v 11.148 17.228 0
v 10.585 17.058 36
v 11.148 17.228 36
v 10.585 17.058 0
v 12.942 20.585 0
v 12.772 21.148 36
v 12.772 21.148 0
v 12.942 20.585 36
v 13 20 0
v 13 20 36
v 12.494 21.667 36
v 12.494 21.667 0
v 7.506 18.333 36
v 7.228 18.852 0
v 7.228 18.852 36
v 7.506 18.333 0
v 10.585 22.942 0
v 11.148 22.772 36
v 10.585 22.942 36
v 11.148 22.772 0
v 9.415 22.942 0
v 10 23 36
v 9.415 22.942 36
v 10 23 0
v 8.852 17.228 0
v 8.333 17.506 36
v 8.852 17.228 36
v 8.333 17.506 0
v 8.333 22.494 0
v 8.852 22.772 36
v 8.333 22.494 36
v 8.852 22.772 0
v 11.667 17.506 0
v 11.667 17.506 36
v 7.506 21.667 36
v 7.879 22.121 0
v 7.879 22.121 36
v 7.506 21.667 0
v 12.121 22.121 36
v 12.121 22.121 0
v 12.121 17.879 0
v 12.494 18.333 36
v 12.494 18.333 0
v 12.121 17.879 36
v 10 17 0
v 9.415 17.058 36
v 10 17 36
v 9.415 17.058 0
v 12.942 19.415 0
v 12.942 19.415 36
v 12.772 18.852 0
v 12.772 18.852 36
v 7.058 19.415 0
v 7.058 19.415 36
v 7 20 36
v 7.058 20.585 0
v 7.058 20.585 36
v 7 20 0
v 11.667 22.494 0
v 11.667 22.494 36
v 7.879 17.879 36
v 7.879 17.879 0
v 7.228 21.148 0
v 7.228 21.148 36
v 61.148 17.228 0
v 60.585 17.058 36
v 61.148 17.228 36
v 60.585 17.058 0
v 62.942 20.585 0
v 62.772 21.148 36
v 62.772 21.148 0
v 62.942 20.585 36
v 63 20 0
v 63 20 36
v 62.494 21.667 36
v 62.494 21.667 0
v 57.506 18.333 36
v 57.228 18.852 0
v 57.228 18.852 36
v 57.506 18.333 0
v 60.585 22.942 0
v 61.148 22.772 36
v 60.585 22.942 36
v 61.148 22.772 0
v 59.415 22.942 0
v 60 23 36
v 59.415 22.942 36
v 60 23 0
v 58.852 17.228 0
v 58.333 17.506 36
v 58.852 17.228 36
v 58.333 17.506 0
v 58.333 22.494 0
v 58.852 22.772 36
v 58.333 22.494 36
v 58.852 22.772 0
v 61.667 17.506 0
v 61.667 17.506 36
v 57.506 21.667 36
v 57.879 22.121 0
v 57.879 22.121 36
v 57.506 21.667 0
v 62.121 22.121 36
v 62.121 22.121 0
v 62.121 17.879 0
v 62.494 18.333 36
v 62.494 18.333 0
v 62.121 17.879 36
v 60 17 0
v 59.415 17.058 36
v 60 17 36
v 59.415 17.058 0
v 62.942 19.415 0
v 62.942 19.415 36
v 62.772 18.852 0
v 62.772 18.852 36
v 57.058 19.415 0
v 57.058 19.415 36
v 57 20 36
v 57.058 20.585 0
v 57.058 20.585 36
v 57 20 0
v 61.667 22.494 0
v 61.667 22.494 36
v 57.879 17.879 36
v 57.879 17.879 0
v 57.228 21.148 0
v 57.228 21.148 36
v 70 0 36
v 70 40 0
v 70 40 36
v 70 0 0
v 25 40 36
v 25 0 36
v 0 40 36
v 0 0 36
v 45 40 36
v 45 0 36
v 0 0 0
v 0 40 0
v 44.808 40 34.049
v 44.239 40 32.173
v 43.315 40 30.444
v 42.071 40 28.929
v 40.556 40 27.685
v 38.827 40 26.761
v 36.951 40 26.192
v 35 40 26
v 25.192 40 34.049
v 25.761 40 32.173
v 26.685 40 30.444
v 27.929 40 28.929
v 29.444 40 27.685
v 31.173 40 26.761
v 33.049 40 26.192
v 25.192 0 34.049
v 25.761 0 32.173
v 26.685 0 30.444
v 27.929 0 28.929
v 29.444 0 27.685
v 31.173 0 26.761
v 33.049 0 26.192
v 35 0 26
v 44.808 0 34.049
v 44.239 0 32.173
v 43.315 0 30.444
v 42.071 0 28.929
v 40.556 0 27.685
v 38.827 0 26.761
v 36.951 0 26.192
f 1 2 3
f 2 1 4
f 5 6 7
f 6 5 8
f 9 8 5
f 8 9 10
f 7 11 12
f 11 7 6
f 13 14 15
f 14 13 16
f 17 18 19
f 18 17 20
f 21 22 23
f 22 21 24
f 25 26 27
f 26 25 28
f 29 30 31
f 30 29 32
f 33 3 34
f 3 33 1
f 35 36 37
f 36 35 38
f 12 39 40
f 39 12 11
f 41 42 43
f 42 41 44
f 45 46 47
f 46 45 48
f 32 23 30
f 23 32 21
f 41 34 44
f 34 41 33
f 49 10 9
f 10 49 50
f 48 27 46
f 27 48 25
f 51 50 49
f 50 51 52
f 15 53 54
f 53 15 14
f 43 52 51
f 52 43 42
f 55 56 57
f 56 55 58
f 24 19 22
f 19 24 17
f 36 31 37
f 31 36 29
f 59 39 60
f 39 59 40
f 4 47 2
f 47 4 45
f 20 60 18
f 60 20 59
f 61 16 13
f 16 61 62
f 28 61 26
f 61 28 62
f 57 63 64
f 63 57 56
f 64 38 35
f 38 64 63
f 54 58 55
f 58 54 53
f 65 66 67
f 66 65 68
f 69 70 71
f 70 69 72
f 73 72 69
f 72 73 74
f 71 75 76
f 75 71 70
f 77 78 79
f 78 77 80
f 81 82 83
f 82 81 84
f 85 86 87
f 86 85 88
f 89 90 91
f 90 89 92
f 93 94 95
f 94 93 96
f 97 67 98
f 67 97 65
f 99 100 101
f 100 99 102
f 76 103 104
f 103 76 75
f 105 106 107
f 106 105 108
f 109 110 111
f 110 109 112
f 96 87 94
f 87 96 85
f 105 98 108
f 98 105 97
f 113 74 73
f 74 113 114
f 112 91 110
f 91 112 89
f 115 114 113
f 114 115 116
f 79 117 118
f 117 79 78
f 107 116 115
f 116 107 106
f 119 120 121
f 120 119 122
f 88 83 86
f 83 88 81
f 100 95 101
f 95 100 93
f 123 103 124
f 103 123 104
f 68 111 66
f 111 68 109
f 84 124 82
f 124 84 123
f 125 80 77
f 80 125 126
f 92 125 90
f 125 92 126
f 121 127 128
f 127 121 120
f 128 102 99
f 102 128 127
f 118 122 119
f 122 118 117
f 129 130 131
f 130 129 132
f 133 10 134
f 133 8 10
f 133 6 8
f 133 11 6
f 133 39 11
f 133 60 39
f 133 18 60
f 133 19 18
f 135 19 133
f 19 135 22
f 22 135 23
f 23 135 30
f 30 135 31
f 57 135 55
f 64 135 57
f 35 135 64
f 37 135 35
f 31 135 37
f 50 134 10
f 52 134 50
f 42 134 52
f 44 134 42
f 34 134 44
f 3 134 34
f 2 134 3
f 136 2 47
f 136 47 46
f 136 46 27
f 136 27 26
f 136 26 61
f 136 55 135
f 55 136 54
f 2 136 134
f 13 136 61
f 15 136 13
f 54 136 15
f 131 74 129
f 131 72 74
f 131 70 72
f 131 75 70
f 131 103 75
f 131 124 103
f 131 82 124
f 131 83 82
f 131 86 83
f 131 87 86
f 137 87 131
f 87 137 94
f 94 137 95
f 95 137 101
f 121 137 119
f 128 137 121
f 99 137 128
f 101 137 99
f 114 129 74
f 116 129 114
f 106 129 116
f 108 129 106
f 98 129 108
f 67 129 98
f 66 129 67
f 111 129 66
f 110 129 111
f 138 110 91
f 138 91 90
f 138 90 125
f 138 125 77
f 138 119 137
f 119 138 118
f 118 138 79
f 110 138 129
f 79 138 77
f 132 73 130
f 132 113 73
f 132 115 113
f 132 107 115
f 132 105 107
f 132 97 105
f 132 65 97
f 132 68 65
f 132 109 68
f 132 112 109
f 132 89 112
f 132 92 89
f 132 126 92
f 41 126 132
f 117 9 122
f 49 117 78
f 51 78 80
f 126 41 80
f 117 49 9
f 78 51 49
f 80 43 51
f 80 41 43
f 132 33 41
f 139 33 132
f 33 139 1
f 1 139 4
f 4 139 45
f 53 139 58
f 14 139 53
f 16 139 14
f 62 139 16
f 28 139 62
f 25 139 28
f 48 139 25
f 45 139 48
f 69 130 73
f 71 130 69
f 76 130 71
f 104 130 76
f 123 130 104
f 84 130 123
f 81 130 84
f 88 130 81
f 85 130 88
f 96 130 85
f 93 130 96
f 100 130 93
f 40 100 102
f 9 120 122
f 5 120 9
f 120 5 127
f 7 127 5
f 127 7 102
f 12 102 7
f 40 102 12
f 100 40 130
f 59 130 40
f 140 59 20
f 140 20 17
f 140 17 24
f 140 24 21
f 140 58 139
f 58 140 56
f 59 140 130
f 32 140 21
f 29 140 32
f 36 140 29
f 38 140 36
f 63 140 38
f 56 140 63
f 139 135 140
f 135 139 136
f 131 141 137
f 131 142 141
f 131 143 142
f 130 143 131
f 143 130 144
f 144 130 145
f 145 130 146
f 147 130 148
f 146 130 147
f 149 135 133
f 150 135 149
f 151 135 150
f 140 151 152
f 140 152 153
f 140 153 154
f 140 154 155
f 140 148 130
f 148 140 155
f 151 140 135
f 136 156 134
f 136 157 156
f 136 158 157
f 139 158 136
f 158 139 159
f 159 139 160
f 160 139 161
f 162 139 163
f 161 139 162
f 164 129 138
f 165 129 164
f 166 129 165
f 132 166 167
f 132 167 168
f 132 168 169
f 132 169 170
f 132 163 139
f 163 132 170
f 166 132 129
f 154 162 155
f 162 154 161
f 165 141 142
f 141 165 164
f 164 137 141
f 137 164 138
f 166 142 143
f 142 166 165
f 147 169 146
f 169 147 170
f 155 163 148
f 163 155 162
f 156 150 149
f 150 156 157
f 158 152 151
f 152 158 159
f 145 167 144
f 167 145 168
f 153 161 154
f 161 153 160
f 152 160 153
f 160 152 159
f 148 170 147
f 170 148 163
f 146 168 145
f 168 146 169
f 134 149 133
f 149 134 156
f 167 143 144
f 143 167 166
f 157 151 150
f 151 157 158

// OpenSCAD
$fn = 32;

// ----------------------------------------------------------------------
// Saddle clamp: plain shaft clamp
// ----------------------------------------------------------------------

// --- parameters (mm) ---
blk_l = 70;               // block length, X
blk_w = 40;               // block width, Y
blk_h = 36;               // block height
clamp_r = 10;             // shaft groove radius
hole_r = 3;               // bolt hole radius
hole_m = 10;              // bolt hole margin from the ends

saw_depth = clamp_r + 3;  // saw kerf depth

difference() {
  cube([blk_l, blk_w, blk_h]);
  translate([blk_l / 2, -1, blk_h])
    rotate([-90, 0, 0])
      cylinder(h = blk_w + 2, r = clamp_r);
  for (sx = [0, 1])
    translate([sx ? blk_l - hole_m : hole_m, blk_w / 2, -1])
      cylinder(r = hole_r, h = blk_h + 2);
}
